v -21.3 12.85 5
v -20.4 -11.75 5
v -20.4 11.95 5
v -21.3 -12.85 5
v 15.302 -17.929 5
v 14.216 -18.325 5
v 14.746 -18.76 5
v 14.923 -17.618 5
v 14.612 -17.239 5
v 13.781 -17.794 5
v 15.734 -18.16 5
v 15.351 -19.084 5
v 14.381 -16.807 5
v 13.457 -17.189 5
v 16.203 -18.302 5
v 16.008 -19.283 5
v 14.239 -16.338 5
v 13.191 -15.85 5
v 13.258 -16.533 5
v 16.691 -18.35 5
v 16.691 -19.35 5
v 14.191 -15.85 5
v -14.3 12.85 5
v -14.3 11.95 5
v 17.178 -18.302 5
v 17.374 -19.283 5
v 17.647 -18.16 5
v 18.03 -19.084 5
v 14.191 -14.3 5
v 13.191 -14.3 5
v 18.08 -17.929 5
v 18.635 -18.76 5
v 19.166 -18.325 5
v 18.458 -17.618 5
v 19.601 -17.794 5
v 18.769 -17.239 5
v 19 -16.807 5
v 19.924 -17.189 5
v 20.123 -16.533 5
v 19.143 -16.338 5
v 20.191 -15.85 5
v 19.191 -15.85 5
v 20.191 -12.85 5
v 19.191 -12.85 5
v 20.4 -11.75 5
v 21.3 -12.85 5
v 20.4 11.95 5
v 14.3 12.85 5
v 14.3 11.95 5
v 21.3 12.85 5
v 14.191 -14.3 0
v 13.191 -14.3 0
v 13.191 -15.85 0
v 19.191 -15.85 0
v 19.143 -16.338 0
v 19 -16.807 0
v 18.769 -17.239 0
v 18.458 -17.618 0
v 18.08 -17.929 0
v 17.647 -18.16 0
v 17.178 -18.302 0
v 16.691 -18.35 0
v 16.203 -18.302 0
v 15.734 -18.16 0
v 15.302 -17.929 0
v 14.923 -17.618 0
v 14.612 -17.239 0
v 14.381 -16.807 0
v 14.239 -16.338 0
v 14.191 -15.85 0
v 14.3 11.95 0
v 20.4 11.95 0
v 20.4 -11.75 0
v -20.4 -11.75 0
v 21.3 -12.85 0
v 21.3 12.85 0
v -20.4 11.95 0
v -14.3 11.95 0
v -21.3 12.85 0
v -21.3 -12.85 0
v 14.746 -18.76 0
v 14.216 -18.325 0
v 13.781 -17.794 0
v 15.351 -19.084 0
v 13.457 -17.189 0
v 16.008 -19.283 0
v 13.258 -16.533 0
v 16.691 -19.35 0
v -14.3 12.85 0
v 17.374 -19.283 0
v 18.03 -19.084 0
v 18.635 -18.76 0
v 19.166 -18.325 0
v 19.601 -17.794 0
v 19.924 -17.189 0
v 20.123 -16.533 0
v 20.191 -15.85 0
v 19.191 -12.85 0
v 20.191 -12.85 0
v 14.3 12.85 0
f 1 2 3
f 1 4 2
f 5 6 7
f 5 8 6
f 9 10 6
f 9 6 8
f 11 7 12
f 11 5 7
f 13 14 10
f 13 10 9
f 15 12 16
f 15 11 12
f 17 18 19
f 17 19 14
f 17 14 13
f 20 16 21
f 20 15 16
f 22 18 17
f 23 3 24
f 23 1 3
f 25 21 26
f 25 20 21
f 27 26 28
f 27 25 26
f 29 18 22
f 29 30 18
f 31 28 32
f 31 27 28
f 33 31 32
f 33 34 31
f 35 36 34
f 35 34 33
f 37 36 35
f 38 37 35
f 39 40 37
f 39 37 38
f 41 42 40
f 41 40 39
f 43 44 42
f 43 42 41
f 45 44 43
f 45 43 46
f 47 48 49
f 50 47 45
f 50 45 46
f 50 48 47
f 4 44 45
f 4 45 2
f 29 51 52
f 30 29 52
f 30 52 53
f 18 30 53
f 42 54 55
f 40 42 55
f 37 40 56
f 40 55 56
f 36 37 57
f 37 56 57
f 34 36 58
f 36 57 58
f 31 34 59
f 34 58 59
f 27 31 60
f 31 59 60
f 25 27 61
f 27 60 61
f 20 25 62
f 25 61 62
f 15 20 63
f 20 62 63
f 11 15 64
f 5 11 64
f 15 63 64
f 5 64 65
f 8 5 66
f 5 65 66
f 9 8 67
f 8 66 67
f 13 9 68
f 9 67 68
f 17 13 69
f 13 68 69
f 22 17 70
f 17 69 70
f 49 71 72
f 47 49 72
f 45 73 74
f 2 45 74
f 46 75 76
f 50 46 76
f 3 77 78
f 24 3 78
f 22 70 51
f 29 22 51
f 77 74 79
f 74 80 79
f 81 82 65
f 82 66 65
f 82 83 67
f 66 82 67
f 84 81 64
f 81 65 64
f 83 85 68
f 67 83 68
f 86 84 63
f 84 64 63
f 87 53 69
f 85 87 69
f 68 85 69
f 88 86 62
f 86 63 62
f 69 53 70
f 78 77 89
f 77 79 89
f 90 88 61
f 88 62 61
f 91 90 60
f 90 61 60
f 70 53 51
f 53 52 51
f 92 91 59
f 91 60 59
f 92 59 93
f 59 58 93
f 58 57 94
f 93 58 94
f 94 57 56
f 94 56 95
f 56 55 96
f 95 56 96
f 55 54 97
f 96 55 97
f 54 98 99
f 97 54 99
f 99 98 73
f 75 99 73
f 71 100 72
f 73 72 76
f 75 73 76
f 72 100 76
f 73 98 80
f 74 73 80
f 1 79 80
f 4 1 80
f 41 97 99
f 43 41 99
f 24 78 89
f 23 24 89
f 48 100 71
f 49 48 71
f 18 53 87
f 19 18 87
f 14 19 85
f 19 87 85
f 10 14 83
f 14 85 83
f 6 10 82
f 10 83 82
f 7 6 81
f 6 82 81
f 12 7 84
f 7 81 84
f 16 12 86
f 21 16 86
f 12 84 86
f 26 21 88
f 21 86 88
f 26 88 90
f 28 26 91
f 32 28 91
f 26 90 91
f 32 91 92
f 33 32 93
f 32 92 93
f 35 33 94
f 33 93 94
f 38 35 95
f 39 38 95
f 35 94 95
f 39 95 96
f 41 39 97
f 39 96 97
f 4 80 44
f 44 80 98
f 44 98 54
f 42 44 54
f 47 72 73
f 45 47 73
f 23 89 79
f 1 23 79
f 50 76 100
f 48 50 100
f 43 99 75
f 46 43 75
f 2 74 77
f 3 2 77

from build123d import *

# Parameters (mm, degrees)
BOSS_EXTRUDE1_DEPTH = 5
BOSS_EXTRUDE2_DEPTH = 5


with BuildPart() as part:
    # Sketch1 → Boss-Extrude1 (new body)
    with BuildSketch(Plane.XY):
        Polygon((-20.4, 11.95), (-14.3, 11.95), (-14.3, 12.85), (-21.3, 12.85), (-21.3, -12.85), (13.190689839, -12.85), (14.190689839, -12.85), (19.190689839, -12.85), (20.190689839, -12.85), (21.3, -12.85), (21.3, 12.85), (14.3, 12.85), (14.3, 11.95), (20.4, 11.95), (20.4, -11.75), (-20.4, -11.75), align=None)
    extrude(amount=BOSS_EXTRUDE1_DEPTH)

    # Sketch1<3> → Boss-Extrude2 (add)
    with BuildSketch(Plane.XY):
        with BuildLine():
            Line((14.190689839, -14.299541794), (13.190689839, -14.299541794))
            Line((13.190689839, -14.299541794), (13.190689839, -15.85))
            ThreePointArc((13.190689839, -15.85), (16.690689839, -19.35), (20.190689839, -15.85))
            Line((20.190689839, -15.85), (20.190689839, -12.85))
            Line((20.190689839, -12.85), (19.190689839, -12.85))
            Line((19.190689839, -12.85), (19.190689839, -15.85))
            ThreePointArc((19.190689839, -15.85), (16.690689839, -18.35), (14.190689839, -15.85))
            Line((14.190689839, -15.85), (14.190689839, -14.299541794))
        make_face()
    extrude(amount=BOSS_EXTRUDE2_DEPTH)


solid = part.part
